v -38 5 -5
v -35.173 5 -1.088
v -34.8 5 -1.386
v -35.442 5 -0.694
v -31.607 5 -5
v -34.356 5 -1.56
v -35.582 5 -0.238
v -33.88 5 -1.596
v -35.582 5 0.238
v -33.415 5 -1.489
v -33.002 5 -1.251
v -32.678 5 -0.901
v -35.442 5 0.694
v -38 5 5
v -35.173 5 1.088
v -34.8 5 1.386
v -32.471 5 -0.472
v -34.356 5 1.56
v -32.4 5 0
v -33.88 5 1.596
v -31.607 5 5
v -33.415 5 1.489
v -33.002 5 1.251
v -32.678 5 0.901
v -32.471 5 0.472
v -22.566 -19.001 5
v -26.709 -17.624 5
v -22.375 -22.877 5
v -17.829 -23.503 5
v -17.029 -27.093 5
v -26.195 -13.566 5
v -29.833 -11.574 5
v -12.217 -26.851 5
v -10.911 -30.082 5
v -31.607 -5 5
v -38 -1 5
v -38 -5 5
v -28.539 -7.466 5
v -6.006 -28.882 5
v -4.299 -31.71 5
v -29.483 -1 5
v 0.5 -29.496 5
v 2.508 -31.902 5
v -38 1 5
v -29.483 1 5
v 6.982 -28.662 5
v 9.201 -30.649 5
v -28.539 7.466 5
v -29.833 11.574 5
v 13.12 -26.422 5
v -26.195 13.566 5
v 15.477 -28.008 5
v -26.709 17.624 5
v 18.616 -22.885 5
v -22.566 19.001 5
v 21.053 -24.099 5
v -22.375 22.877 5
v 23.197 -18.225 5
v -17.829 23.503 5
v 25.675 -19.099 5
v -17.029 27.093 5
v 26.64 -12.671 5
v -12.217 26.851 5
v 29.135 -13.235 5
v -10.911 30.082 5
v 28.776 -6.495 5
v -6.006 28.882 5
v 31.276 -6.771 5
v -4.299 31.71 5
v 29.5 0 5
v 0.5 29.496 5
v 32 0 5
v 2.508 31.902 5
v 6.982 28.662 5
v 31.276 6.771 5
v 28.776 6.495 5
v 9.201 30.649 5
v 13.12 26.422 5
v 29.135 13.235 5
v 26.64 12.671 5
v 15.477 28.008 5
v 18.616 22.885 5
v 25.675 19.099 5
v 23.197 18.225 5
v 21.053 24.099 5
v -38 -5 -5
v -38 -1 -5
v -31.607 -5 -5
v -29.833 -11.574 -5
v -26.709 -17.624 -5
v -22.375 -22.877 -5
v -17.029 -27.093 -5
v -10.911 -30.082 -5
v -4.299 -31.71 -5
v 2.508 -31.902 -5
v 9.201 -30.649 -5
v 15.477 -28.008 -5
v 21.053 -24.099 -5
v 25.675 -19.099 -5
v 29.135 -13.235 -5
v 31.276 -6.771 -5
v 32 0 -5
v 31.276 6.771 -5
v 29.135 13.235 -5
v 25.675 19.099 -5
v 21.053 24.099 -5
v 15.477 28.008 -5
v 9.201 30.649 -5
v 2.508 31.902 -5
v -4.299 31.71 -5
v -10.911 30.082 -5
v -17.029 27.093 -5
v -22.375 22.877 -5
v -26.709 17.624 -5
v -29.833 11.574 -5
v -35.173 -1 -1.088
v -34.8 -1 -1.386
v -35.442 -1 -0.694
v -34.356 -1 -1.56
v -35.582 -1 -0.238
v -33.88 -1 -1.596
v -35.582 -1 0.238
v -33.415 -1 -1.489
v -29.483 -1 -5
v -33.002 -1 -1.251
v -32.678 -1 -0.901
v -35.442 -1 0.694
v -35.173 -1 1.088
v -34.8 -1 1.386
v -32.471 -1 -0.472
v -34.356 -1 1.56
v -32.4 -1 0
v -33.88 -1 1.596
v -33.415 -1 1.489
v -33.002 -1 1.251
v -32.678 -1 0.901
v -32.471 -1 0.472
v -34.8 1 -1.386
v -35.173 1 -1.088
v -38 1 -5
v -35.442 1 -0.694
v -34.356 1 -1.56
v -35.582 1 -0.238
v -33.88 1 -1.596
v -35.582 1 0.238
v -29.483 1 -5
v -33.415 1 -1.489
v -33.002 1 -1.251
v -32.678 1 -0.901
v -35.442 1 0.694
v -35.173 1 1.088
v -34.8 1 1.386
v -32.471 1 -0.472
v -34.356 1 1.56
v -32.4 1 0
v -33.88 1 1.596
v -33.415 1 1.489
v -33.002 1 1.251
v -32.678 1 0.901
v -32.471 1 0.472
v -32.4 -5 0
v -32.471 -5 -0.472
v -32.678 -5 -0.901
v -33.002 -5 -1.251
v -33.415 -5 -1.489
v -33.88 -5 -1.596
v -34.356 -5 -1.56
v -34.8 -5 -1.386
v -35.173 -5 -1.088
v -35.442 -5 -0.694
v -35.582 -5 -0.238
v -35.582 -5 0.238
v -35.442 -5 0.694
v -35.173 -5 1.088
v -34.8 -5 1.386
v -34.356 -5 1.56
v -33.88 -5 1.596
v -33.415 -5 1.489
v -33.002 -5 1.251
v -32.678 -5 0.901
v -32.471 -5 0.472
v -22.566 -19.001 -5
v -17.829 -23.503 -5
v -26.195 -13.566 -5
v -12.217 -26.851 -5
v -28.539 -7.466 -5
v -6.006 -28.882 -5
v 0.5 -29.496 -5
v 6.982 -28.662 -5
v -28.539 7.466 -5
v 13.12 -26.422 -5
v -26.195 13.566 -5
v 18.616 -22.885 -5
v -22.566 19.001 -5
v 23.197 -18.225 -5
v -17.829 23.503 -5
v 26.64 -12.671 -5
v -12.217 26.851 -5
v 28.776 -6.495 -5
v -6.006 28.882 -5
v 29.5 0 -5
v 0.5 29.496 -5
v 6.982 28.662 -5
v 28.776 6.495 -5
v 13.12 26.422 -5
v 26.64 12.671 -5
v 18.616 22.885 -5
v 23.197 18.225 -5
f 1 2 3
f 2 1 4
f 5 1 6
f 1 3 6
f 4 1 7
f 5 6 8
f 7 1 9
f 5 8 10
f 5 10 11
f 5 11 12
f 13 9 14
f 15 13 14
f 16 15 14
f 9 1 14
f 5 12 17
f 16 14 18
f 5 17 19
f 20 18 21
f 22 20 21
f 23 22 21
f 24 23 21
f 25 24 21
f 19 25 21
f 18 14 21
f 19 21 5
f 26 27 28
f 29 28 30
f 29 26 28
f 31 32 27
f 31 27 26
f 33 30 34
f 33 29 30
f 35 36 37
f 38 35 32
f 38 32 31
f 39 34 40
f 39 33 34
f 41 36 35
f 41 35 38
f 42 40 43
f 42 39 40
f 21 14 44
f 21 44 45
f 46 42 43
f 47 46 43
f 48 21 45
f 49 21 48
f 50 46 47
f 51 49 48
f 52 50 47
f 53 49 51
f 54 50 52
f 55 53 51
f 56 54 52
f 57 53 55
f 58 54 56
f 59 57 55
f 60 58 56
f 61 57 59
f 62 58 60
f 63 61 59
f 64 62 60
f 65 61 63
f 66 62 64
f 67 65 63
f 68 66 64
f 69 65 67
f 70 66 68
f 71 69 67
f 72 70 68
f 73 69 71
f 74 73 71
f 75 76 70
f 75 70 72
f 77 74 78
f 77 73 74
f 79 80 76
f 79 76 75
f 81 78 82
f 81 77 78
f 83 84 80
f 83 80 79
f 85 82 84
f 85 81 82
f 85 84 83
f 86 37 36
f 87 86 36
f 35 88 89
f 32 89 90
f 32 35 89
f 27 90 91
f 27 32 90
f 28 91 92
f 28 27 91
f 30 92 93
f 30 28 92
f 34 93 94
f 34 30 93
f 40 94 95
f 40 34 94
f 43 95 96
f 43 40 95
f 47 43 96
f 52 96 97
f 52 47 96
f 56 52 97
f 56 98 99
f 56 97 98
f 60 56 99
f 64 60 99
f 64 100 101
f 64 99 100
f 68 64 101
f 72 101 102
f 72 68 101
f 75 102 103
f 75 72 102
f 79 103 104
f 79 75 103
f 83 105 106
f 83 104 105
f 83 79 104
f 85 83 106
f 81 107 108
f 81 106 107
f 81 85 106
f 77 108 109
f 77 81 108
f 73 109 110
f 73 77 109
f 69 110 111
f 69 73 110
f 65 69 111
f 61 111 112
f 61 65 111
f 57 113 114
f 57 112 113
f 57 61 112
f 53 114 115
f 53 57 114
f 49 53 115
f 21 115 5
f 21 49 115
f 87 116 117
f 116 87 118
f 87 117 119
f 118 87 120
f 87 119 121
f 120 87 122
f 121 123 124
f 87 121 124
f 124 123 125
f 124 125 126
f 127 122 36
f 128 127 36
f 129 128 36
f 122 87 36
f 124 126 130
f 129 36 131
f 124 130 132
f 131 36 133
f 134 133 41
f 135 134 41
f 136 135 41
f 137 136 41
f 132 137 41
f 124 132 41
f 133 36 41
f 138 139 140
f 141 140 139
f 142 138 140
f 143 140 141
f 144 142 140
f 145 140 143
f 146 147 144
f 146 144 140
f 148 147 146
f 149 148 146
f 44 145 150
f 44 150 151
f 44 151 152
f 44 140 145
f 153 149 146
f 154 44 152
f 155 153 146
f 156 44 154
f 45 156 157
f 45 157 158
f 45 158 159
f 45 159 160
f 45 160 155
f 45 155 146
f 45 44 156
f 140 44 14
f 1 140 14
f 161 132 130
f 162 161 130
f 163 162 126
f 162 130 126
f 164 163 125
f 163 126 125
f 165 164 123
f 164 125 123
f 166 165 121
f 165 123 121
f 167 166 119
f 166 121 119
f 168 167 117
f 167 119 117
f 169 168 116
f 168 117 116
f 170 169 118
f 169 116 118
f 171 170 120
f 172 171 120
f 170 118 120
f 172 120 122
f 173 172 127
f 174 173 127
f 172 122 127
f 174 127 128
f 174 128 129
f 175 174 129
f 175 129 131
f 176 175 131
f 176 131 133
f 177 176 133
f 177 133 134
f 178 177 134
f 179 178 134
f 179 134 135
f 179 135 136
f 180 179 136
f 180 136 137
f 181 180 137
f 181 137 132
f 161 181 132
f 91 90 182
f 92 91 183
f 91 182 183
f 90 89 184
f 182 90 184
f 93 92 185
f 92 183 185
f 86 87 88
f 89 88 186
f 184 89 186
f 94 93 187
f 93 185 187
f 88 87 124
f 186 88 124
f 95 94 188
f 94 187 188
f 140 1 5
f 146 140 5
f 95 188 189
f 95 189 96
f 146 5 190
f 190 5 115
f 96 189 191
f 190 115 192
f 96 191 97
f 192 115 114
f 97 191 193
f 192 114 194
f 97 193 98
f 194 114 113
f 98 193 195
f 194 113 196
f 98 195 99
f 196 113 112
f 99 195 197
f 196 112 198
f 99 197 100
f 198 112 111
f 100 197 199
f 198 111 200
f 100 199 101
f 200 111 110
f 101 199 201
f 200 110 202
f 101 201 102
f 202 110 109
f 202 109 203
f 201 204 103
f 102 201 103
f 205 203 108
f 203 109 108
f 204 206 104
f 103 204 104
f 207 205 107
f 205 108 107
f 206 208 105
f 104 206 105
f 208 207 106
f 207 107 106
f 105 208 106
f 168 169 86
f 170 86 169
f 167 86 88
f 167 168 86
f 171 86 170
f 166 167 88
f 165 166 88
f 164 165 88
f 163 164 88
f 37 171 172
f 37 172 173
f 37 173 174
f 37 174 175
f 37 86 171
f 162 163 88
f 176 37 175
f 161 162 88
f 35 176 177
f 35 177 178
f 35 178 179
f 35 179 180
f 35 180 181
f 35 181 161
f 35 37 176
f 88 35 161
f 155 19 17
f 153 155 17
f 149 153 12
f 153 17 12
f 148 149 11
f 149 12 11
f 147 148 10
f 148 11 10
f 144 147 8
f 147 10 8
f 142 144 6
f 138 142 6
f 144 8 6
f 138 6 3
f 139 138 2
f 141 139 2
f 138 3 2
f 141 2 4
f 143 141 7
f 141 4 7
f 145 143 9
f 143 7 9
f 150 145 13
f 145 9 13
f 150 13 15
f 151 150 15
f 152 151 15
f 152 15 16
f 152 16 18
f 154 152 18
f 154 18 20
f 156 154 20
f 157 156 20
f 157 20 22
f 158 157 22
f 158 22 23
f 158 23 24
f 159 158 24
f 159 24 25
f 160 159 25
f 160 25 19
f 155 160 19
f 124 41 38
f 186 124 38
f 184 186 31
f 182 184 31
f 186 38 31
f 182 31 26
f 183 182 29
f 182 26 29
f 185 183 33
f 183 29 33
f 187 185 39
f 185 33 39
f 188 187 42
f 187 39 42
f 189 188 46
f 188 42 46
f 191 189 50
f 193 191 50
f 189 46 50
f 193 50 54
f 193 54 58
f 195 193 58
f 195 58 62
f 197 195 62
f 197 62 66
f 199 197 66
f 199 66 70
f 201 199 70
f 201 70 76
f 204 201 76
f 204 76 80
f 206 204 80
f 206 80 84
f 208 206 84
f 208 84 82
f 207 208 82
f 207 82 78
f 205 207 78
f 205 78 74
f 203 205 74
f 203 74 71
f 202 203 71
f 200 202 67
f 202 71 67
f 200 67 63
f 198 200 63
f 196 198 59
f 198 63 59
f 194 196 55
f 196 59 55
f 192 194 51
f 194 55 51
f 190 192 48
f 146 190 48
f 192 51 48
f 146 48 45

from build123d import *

# Parameters (mm, degrees)
SKETCH1_R               = 32
BOSS_EXTRUDE1_DEPTH     = 5
SKETCH4_W               = 38
SKETCH4_H               = 10
BOSS_EXTRUDE2_DEPTH     = 5
SKETCH5_R               = 29.5
SKETCH5_W               = 38
SKETCH5_H               = 2
CUT_EXTRUDE1_DEPTH      = 26.5
SKETCH6_R               = 1.6
CUT_EXTRUDE2_DEPTH      = 28
CUT_EXTRUDE2_DEPTH_BACK = 10


with BuildPart() as part:
    # Sketch1 → Boss-Extrude1 (new body, symmetric)
    with BuildSketch(Plane.XY):
        Circle(SKETCH1_R)
    extrude(amount=BOSS_EXTRUDE1_DEPTH, both=True)

    # Sketch4 → Boss-Extrude2 (add, symmetric)
    with BuildSketch(Plane.XY):
        with Locations((-19, 0)):
            Rectangle(SKETCH4_W, SKETCH4_H)
    extrude(amount=BOSS_EXTRUDE2_DEPTH, both=True)

    # Sketch5 → Cut-Extrude1 (cut)
    with BuildSketch(Plane.XY.offset(5)):
        Circle(SKETCH5_R)
        with Locations((-19, 0)):
            Rectangle(SKETCH5_W, SKETCH5_H)
    extrude(amount=-CUT_EXTRUDE1_DEPTH, mode=Mode.SUBTRACT)

    # Sketch6 → Cut-Extrude2 (cut, two sides)
    with BuildSketch(Plane(origin=(0, 5, 0), x_dir=(1, 0, 0), z_dir=(0, 1, 0))) as cut_extrude2_sk:
        with Locations((-34, 0)):
            Circle(SKETCH6_R)
    extrude(amount=CUT_EXTRUDE2_DEPTH, mode=Mode.SUBTRACT)
    extrude(cut_extrude2_sk.sketch, amount=-CUT_EXTRUDE2_DEPTH_BACK, mode=Mode.SUBTRACT)


solid = part.part
